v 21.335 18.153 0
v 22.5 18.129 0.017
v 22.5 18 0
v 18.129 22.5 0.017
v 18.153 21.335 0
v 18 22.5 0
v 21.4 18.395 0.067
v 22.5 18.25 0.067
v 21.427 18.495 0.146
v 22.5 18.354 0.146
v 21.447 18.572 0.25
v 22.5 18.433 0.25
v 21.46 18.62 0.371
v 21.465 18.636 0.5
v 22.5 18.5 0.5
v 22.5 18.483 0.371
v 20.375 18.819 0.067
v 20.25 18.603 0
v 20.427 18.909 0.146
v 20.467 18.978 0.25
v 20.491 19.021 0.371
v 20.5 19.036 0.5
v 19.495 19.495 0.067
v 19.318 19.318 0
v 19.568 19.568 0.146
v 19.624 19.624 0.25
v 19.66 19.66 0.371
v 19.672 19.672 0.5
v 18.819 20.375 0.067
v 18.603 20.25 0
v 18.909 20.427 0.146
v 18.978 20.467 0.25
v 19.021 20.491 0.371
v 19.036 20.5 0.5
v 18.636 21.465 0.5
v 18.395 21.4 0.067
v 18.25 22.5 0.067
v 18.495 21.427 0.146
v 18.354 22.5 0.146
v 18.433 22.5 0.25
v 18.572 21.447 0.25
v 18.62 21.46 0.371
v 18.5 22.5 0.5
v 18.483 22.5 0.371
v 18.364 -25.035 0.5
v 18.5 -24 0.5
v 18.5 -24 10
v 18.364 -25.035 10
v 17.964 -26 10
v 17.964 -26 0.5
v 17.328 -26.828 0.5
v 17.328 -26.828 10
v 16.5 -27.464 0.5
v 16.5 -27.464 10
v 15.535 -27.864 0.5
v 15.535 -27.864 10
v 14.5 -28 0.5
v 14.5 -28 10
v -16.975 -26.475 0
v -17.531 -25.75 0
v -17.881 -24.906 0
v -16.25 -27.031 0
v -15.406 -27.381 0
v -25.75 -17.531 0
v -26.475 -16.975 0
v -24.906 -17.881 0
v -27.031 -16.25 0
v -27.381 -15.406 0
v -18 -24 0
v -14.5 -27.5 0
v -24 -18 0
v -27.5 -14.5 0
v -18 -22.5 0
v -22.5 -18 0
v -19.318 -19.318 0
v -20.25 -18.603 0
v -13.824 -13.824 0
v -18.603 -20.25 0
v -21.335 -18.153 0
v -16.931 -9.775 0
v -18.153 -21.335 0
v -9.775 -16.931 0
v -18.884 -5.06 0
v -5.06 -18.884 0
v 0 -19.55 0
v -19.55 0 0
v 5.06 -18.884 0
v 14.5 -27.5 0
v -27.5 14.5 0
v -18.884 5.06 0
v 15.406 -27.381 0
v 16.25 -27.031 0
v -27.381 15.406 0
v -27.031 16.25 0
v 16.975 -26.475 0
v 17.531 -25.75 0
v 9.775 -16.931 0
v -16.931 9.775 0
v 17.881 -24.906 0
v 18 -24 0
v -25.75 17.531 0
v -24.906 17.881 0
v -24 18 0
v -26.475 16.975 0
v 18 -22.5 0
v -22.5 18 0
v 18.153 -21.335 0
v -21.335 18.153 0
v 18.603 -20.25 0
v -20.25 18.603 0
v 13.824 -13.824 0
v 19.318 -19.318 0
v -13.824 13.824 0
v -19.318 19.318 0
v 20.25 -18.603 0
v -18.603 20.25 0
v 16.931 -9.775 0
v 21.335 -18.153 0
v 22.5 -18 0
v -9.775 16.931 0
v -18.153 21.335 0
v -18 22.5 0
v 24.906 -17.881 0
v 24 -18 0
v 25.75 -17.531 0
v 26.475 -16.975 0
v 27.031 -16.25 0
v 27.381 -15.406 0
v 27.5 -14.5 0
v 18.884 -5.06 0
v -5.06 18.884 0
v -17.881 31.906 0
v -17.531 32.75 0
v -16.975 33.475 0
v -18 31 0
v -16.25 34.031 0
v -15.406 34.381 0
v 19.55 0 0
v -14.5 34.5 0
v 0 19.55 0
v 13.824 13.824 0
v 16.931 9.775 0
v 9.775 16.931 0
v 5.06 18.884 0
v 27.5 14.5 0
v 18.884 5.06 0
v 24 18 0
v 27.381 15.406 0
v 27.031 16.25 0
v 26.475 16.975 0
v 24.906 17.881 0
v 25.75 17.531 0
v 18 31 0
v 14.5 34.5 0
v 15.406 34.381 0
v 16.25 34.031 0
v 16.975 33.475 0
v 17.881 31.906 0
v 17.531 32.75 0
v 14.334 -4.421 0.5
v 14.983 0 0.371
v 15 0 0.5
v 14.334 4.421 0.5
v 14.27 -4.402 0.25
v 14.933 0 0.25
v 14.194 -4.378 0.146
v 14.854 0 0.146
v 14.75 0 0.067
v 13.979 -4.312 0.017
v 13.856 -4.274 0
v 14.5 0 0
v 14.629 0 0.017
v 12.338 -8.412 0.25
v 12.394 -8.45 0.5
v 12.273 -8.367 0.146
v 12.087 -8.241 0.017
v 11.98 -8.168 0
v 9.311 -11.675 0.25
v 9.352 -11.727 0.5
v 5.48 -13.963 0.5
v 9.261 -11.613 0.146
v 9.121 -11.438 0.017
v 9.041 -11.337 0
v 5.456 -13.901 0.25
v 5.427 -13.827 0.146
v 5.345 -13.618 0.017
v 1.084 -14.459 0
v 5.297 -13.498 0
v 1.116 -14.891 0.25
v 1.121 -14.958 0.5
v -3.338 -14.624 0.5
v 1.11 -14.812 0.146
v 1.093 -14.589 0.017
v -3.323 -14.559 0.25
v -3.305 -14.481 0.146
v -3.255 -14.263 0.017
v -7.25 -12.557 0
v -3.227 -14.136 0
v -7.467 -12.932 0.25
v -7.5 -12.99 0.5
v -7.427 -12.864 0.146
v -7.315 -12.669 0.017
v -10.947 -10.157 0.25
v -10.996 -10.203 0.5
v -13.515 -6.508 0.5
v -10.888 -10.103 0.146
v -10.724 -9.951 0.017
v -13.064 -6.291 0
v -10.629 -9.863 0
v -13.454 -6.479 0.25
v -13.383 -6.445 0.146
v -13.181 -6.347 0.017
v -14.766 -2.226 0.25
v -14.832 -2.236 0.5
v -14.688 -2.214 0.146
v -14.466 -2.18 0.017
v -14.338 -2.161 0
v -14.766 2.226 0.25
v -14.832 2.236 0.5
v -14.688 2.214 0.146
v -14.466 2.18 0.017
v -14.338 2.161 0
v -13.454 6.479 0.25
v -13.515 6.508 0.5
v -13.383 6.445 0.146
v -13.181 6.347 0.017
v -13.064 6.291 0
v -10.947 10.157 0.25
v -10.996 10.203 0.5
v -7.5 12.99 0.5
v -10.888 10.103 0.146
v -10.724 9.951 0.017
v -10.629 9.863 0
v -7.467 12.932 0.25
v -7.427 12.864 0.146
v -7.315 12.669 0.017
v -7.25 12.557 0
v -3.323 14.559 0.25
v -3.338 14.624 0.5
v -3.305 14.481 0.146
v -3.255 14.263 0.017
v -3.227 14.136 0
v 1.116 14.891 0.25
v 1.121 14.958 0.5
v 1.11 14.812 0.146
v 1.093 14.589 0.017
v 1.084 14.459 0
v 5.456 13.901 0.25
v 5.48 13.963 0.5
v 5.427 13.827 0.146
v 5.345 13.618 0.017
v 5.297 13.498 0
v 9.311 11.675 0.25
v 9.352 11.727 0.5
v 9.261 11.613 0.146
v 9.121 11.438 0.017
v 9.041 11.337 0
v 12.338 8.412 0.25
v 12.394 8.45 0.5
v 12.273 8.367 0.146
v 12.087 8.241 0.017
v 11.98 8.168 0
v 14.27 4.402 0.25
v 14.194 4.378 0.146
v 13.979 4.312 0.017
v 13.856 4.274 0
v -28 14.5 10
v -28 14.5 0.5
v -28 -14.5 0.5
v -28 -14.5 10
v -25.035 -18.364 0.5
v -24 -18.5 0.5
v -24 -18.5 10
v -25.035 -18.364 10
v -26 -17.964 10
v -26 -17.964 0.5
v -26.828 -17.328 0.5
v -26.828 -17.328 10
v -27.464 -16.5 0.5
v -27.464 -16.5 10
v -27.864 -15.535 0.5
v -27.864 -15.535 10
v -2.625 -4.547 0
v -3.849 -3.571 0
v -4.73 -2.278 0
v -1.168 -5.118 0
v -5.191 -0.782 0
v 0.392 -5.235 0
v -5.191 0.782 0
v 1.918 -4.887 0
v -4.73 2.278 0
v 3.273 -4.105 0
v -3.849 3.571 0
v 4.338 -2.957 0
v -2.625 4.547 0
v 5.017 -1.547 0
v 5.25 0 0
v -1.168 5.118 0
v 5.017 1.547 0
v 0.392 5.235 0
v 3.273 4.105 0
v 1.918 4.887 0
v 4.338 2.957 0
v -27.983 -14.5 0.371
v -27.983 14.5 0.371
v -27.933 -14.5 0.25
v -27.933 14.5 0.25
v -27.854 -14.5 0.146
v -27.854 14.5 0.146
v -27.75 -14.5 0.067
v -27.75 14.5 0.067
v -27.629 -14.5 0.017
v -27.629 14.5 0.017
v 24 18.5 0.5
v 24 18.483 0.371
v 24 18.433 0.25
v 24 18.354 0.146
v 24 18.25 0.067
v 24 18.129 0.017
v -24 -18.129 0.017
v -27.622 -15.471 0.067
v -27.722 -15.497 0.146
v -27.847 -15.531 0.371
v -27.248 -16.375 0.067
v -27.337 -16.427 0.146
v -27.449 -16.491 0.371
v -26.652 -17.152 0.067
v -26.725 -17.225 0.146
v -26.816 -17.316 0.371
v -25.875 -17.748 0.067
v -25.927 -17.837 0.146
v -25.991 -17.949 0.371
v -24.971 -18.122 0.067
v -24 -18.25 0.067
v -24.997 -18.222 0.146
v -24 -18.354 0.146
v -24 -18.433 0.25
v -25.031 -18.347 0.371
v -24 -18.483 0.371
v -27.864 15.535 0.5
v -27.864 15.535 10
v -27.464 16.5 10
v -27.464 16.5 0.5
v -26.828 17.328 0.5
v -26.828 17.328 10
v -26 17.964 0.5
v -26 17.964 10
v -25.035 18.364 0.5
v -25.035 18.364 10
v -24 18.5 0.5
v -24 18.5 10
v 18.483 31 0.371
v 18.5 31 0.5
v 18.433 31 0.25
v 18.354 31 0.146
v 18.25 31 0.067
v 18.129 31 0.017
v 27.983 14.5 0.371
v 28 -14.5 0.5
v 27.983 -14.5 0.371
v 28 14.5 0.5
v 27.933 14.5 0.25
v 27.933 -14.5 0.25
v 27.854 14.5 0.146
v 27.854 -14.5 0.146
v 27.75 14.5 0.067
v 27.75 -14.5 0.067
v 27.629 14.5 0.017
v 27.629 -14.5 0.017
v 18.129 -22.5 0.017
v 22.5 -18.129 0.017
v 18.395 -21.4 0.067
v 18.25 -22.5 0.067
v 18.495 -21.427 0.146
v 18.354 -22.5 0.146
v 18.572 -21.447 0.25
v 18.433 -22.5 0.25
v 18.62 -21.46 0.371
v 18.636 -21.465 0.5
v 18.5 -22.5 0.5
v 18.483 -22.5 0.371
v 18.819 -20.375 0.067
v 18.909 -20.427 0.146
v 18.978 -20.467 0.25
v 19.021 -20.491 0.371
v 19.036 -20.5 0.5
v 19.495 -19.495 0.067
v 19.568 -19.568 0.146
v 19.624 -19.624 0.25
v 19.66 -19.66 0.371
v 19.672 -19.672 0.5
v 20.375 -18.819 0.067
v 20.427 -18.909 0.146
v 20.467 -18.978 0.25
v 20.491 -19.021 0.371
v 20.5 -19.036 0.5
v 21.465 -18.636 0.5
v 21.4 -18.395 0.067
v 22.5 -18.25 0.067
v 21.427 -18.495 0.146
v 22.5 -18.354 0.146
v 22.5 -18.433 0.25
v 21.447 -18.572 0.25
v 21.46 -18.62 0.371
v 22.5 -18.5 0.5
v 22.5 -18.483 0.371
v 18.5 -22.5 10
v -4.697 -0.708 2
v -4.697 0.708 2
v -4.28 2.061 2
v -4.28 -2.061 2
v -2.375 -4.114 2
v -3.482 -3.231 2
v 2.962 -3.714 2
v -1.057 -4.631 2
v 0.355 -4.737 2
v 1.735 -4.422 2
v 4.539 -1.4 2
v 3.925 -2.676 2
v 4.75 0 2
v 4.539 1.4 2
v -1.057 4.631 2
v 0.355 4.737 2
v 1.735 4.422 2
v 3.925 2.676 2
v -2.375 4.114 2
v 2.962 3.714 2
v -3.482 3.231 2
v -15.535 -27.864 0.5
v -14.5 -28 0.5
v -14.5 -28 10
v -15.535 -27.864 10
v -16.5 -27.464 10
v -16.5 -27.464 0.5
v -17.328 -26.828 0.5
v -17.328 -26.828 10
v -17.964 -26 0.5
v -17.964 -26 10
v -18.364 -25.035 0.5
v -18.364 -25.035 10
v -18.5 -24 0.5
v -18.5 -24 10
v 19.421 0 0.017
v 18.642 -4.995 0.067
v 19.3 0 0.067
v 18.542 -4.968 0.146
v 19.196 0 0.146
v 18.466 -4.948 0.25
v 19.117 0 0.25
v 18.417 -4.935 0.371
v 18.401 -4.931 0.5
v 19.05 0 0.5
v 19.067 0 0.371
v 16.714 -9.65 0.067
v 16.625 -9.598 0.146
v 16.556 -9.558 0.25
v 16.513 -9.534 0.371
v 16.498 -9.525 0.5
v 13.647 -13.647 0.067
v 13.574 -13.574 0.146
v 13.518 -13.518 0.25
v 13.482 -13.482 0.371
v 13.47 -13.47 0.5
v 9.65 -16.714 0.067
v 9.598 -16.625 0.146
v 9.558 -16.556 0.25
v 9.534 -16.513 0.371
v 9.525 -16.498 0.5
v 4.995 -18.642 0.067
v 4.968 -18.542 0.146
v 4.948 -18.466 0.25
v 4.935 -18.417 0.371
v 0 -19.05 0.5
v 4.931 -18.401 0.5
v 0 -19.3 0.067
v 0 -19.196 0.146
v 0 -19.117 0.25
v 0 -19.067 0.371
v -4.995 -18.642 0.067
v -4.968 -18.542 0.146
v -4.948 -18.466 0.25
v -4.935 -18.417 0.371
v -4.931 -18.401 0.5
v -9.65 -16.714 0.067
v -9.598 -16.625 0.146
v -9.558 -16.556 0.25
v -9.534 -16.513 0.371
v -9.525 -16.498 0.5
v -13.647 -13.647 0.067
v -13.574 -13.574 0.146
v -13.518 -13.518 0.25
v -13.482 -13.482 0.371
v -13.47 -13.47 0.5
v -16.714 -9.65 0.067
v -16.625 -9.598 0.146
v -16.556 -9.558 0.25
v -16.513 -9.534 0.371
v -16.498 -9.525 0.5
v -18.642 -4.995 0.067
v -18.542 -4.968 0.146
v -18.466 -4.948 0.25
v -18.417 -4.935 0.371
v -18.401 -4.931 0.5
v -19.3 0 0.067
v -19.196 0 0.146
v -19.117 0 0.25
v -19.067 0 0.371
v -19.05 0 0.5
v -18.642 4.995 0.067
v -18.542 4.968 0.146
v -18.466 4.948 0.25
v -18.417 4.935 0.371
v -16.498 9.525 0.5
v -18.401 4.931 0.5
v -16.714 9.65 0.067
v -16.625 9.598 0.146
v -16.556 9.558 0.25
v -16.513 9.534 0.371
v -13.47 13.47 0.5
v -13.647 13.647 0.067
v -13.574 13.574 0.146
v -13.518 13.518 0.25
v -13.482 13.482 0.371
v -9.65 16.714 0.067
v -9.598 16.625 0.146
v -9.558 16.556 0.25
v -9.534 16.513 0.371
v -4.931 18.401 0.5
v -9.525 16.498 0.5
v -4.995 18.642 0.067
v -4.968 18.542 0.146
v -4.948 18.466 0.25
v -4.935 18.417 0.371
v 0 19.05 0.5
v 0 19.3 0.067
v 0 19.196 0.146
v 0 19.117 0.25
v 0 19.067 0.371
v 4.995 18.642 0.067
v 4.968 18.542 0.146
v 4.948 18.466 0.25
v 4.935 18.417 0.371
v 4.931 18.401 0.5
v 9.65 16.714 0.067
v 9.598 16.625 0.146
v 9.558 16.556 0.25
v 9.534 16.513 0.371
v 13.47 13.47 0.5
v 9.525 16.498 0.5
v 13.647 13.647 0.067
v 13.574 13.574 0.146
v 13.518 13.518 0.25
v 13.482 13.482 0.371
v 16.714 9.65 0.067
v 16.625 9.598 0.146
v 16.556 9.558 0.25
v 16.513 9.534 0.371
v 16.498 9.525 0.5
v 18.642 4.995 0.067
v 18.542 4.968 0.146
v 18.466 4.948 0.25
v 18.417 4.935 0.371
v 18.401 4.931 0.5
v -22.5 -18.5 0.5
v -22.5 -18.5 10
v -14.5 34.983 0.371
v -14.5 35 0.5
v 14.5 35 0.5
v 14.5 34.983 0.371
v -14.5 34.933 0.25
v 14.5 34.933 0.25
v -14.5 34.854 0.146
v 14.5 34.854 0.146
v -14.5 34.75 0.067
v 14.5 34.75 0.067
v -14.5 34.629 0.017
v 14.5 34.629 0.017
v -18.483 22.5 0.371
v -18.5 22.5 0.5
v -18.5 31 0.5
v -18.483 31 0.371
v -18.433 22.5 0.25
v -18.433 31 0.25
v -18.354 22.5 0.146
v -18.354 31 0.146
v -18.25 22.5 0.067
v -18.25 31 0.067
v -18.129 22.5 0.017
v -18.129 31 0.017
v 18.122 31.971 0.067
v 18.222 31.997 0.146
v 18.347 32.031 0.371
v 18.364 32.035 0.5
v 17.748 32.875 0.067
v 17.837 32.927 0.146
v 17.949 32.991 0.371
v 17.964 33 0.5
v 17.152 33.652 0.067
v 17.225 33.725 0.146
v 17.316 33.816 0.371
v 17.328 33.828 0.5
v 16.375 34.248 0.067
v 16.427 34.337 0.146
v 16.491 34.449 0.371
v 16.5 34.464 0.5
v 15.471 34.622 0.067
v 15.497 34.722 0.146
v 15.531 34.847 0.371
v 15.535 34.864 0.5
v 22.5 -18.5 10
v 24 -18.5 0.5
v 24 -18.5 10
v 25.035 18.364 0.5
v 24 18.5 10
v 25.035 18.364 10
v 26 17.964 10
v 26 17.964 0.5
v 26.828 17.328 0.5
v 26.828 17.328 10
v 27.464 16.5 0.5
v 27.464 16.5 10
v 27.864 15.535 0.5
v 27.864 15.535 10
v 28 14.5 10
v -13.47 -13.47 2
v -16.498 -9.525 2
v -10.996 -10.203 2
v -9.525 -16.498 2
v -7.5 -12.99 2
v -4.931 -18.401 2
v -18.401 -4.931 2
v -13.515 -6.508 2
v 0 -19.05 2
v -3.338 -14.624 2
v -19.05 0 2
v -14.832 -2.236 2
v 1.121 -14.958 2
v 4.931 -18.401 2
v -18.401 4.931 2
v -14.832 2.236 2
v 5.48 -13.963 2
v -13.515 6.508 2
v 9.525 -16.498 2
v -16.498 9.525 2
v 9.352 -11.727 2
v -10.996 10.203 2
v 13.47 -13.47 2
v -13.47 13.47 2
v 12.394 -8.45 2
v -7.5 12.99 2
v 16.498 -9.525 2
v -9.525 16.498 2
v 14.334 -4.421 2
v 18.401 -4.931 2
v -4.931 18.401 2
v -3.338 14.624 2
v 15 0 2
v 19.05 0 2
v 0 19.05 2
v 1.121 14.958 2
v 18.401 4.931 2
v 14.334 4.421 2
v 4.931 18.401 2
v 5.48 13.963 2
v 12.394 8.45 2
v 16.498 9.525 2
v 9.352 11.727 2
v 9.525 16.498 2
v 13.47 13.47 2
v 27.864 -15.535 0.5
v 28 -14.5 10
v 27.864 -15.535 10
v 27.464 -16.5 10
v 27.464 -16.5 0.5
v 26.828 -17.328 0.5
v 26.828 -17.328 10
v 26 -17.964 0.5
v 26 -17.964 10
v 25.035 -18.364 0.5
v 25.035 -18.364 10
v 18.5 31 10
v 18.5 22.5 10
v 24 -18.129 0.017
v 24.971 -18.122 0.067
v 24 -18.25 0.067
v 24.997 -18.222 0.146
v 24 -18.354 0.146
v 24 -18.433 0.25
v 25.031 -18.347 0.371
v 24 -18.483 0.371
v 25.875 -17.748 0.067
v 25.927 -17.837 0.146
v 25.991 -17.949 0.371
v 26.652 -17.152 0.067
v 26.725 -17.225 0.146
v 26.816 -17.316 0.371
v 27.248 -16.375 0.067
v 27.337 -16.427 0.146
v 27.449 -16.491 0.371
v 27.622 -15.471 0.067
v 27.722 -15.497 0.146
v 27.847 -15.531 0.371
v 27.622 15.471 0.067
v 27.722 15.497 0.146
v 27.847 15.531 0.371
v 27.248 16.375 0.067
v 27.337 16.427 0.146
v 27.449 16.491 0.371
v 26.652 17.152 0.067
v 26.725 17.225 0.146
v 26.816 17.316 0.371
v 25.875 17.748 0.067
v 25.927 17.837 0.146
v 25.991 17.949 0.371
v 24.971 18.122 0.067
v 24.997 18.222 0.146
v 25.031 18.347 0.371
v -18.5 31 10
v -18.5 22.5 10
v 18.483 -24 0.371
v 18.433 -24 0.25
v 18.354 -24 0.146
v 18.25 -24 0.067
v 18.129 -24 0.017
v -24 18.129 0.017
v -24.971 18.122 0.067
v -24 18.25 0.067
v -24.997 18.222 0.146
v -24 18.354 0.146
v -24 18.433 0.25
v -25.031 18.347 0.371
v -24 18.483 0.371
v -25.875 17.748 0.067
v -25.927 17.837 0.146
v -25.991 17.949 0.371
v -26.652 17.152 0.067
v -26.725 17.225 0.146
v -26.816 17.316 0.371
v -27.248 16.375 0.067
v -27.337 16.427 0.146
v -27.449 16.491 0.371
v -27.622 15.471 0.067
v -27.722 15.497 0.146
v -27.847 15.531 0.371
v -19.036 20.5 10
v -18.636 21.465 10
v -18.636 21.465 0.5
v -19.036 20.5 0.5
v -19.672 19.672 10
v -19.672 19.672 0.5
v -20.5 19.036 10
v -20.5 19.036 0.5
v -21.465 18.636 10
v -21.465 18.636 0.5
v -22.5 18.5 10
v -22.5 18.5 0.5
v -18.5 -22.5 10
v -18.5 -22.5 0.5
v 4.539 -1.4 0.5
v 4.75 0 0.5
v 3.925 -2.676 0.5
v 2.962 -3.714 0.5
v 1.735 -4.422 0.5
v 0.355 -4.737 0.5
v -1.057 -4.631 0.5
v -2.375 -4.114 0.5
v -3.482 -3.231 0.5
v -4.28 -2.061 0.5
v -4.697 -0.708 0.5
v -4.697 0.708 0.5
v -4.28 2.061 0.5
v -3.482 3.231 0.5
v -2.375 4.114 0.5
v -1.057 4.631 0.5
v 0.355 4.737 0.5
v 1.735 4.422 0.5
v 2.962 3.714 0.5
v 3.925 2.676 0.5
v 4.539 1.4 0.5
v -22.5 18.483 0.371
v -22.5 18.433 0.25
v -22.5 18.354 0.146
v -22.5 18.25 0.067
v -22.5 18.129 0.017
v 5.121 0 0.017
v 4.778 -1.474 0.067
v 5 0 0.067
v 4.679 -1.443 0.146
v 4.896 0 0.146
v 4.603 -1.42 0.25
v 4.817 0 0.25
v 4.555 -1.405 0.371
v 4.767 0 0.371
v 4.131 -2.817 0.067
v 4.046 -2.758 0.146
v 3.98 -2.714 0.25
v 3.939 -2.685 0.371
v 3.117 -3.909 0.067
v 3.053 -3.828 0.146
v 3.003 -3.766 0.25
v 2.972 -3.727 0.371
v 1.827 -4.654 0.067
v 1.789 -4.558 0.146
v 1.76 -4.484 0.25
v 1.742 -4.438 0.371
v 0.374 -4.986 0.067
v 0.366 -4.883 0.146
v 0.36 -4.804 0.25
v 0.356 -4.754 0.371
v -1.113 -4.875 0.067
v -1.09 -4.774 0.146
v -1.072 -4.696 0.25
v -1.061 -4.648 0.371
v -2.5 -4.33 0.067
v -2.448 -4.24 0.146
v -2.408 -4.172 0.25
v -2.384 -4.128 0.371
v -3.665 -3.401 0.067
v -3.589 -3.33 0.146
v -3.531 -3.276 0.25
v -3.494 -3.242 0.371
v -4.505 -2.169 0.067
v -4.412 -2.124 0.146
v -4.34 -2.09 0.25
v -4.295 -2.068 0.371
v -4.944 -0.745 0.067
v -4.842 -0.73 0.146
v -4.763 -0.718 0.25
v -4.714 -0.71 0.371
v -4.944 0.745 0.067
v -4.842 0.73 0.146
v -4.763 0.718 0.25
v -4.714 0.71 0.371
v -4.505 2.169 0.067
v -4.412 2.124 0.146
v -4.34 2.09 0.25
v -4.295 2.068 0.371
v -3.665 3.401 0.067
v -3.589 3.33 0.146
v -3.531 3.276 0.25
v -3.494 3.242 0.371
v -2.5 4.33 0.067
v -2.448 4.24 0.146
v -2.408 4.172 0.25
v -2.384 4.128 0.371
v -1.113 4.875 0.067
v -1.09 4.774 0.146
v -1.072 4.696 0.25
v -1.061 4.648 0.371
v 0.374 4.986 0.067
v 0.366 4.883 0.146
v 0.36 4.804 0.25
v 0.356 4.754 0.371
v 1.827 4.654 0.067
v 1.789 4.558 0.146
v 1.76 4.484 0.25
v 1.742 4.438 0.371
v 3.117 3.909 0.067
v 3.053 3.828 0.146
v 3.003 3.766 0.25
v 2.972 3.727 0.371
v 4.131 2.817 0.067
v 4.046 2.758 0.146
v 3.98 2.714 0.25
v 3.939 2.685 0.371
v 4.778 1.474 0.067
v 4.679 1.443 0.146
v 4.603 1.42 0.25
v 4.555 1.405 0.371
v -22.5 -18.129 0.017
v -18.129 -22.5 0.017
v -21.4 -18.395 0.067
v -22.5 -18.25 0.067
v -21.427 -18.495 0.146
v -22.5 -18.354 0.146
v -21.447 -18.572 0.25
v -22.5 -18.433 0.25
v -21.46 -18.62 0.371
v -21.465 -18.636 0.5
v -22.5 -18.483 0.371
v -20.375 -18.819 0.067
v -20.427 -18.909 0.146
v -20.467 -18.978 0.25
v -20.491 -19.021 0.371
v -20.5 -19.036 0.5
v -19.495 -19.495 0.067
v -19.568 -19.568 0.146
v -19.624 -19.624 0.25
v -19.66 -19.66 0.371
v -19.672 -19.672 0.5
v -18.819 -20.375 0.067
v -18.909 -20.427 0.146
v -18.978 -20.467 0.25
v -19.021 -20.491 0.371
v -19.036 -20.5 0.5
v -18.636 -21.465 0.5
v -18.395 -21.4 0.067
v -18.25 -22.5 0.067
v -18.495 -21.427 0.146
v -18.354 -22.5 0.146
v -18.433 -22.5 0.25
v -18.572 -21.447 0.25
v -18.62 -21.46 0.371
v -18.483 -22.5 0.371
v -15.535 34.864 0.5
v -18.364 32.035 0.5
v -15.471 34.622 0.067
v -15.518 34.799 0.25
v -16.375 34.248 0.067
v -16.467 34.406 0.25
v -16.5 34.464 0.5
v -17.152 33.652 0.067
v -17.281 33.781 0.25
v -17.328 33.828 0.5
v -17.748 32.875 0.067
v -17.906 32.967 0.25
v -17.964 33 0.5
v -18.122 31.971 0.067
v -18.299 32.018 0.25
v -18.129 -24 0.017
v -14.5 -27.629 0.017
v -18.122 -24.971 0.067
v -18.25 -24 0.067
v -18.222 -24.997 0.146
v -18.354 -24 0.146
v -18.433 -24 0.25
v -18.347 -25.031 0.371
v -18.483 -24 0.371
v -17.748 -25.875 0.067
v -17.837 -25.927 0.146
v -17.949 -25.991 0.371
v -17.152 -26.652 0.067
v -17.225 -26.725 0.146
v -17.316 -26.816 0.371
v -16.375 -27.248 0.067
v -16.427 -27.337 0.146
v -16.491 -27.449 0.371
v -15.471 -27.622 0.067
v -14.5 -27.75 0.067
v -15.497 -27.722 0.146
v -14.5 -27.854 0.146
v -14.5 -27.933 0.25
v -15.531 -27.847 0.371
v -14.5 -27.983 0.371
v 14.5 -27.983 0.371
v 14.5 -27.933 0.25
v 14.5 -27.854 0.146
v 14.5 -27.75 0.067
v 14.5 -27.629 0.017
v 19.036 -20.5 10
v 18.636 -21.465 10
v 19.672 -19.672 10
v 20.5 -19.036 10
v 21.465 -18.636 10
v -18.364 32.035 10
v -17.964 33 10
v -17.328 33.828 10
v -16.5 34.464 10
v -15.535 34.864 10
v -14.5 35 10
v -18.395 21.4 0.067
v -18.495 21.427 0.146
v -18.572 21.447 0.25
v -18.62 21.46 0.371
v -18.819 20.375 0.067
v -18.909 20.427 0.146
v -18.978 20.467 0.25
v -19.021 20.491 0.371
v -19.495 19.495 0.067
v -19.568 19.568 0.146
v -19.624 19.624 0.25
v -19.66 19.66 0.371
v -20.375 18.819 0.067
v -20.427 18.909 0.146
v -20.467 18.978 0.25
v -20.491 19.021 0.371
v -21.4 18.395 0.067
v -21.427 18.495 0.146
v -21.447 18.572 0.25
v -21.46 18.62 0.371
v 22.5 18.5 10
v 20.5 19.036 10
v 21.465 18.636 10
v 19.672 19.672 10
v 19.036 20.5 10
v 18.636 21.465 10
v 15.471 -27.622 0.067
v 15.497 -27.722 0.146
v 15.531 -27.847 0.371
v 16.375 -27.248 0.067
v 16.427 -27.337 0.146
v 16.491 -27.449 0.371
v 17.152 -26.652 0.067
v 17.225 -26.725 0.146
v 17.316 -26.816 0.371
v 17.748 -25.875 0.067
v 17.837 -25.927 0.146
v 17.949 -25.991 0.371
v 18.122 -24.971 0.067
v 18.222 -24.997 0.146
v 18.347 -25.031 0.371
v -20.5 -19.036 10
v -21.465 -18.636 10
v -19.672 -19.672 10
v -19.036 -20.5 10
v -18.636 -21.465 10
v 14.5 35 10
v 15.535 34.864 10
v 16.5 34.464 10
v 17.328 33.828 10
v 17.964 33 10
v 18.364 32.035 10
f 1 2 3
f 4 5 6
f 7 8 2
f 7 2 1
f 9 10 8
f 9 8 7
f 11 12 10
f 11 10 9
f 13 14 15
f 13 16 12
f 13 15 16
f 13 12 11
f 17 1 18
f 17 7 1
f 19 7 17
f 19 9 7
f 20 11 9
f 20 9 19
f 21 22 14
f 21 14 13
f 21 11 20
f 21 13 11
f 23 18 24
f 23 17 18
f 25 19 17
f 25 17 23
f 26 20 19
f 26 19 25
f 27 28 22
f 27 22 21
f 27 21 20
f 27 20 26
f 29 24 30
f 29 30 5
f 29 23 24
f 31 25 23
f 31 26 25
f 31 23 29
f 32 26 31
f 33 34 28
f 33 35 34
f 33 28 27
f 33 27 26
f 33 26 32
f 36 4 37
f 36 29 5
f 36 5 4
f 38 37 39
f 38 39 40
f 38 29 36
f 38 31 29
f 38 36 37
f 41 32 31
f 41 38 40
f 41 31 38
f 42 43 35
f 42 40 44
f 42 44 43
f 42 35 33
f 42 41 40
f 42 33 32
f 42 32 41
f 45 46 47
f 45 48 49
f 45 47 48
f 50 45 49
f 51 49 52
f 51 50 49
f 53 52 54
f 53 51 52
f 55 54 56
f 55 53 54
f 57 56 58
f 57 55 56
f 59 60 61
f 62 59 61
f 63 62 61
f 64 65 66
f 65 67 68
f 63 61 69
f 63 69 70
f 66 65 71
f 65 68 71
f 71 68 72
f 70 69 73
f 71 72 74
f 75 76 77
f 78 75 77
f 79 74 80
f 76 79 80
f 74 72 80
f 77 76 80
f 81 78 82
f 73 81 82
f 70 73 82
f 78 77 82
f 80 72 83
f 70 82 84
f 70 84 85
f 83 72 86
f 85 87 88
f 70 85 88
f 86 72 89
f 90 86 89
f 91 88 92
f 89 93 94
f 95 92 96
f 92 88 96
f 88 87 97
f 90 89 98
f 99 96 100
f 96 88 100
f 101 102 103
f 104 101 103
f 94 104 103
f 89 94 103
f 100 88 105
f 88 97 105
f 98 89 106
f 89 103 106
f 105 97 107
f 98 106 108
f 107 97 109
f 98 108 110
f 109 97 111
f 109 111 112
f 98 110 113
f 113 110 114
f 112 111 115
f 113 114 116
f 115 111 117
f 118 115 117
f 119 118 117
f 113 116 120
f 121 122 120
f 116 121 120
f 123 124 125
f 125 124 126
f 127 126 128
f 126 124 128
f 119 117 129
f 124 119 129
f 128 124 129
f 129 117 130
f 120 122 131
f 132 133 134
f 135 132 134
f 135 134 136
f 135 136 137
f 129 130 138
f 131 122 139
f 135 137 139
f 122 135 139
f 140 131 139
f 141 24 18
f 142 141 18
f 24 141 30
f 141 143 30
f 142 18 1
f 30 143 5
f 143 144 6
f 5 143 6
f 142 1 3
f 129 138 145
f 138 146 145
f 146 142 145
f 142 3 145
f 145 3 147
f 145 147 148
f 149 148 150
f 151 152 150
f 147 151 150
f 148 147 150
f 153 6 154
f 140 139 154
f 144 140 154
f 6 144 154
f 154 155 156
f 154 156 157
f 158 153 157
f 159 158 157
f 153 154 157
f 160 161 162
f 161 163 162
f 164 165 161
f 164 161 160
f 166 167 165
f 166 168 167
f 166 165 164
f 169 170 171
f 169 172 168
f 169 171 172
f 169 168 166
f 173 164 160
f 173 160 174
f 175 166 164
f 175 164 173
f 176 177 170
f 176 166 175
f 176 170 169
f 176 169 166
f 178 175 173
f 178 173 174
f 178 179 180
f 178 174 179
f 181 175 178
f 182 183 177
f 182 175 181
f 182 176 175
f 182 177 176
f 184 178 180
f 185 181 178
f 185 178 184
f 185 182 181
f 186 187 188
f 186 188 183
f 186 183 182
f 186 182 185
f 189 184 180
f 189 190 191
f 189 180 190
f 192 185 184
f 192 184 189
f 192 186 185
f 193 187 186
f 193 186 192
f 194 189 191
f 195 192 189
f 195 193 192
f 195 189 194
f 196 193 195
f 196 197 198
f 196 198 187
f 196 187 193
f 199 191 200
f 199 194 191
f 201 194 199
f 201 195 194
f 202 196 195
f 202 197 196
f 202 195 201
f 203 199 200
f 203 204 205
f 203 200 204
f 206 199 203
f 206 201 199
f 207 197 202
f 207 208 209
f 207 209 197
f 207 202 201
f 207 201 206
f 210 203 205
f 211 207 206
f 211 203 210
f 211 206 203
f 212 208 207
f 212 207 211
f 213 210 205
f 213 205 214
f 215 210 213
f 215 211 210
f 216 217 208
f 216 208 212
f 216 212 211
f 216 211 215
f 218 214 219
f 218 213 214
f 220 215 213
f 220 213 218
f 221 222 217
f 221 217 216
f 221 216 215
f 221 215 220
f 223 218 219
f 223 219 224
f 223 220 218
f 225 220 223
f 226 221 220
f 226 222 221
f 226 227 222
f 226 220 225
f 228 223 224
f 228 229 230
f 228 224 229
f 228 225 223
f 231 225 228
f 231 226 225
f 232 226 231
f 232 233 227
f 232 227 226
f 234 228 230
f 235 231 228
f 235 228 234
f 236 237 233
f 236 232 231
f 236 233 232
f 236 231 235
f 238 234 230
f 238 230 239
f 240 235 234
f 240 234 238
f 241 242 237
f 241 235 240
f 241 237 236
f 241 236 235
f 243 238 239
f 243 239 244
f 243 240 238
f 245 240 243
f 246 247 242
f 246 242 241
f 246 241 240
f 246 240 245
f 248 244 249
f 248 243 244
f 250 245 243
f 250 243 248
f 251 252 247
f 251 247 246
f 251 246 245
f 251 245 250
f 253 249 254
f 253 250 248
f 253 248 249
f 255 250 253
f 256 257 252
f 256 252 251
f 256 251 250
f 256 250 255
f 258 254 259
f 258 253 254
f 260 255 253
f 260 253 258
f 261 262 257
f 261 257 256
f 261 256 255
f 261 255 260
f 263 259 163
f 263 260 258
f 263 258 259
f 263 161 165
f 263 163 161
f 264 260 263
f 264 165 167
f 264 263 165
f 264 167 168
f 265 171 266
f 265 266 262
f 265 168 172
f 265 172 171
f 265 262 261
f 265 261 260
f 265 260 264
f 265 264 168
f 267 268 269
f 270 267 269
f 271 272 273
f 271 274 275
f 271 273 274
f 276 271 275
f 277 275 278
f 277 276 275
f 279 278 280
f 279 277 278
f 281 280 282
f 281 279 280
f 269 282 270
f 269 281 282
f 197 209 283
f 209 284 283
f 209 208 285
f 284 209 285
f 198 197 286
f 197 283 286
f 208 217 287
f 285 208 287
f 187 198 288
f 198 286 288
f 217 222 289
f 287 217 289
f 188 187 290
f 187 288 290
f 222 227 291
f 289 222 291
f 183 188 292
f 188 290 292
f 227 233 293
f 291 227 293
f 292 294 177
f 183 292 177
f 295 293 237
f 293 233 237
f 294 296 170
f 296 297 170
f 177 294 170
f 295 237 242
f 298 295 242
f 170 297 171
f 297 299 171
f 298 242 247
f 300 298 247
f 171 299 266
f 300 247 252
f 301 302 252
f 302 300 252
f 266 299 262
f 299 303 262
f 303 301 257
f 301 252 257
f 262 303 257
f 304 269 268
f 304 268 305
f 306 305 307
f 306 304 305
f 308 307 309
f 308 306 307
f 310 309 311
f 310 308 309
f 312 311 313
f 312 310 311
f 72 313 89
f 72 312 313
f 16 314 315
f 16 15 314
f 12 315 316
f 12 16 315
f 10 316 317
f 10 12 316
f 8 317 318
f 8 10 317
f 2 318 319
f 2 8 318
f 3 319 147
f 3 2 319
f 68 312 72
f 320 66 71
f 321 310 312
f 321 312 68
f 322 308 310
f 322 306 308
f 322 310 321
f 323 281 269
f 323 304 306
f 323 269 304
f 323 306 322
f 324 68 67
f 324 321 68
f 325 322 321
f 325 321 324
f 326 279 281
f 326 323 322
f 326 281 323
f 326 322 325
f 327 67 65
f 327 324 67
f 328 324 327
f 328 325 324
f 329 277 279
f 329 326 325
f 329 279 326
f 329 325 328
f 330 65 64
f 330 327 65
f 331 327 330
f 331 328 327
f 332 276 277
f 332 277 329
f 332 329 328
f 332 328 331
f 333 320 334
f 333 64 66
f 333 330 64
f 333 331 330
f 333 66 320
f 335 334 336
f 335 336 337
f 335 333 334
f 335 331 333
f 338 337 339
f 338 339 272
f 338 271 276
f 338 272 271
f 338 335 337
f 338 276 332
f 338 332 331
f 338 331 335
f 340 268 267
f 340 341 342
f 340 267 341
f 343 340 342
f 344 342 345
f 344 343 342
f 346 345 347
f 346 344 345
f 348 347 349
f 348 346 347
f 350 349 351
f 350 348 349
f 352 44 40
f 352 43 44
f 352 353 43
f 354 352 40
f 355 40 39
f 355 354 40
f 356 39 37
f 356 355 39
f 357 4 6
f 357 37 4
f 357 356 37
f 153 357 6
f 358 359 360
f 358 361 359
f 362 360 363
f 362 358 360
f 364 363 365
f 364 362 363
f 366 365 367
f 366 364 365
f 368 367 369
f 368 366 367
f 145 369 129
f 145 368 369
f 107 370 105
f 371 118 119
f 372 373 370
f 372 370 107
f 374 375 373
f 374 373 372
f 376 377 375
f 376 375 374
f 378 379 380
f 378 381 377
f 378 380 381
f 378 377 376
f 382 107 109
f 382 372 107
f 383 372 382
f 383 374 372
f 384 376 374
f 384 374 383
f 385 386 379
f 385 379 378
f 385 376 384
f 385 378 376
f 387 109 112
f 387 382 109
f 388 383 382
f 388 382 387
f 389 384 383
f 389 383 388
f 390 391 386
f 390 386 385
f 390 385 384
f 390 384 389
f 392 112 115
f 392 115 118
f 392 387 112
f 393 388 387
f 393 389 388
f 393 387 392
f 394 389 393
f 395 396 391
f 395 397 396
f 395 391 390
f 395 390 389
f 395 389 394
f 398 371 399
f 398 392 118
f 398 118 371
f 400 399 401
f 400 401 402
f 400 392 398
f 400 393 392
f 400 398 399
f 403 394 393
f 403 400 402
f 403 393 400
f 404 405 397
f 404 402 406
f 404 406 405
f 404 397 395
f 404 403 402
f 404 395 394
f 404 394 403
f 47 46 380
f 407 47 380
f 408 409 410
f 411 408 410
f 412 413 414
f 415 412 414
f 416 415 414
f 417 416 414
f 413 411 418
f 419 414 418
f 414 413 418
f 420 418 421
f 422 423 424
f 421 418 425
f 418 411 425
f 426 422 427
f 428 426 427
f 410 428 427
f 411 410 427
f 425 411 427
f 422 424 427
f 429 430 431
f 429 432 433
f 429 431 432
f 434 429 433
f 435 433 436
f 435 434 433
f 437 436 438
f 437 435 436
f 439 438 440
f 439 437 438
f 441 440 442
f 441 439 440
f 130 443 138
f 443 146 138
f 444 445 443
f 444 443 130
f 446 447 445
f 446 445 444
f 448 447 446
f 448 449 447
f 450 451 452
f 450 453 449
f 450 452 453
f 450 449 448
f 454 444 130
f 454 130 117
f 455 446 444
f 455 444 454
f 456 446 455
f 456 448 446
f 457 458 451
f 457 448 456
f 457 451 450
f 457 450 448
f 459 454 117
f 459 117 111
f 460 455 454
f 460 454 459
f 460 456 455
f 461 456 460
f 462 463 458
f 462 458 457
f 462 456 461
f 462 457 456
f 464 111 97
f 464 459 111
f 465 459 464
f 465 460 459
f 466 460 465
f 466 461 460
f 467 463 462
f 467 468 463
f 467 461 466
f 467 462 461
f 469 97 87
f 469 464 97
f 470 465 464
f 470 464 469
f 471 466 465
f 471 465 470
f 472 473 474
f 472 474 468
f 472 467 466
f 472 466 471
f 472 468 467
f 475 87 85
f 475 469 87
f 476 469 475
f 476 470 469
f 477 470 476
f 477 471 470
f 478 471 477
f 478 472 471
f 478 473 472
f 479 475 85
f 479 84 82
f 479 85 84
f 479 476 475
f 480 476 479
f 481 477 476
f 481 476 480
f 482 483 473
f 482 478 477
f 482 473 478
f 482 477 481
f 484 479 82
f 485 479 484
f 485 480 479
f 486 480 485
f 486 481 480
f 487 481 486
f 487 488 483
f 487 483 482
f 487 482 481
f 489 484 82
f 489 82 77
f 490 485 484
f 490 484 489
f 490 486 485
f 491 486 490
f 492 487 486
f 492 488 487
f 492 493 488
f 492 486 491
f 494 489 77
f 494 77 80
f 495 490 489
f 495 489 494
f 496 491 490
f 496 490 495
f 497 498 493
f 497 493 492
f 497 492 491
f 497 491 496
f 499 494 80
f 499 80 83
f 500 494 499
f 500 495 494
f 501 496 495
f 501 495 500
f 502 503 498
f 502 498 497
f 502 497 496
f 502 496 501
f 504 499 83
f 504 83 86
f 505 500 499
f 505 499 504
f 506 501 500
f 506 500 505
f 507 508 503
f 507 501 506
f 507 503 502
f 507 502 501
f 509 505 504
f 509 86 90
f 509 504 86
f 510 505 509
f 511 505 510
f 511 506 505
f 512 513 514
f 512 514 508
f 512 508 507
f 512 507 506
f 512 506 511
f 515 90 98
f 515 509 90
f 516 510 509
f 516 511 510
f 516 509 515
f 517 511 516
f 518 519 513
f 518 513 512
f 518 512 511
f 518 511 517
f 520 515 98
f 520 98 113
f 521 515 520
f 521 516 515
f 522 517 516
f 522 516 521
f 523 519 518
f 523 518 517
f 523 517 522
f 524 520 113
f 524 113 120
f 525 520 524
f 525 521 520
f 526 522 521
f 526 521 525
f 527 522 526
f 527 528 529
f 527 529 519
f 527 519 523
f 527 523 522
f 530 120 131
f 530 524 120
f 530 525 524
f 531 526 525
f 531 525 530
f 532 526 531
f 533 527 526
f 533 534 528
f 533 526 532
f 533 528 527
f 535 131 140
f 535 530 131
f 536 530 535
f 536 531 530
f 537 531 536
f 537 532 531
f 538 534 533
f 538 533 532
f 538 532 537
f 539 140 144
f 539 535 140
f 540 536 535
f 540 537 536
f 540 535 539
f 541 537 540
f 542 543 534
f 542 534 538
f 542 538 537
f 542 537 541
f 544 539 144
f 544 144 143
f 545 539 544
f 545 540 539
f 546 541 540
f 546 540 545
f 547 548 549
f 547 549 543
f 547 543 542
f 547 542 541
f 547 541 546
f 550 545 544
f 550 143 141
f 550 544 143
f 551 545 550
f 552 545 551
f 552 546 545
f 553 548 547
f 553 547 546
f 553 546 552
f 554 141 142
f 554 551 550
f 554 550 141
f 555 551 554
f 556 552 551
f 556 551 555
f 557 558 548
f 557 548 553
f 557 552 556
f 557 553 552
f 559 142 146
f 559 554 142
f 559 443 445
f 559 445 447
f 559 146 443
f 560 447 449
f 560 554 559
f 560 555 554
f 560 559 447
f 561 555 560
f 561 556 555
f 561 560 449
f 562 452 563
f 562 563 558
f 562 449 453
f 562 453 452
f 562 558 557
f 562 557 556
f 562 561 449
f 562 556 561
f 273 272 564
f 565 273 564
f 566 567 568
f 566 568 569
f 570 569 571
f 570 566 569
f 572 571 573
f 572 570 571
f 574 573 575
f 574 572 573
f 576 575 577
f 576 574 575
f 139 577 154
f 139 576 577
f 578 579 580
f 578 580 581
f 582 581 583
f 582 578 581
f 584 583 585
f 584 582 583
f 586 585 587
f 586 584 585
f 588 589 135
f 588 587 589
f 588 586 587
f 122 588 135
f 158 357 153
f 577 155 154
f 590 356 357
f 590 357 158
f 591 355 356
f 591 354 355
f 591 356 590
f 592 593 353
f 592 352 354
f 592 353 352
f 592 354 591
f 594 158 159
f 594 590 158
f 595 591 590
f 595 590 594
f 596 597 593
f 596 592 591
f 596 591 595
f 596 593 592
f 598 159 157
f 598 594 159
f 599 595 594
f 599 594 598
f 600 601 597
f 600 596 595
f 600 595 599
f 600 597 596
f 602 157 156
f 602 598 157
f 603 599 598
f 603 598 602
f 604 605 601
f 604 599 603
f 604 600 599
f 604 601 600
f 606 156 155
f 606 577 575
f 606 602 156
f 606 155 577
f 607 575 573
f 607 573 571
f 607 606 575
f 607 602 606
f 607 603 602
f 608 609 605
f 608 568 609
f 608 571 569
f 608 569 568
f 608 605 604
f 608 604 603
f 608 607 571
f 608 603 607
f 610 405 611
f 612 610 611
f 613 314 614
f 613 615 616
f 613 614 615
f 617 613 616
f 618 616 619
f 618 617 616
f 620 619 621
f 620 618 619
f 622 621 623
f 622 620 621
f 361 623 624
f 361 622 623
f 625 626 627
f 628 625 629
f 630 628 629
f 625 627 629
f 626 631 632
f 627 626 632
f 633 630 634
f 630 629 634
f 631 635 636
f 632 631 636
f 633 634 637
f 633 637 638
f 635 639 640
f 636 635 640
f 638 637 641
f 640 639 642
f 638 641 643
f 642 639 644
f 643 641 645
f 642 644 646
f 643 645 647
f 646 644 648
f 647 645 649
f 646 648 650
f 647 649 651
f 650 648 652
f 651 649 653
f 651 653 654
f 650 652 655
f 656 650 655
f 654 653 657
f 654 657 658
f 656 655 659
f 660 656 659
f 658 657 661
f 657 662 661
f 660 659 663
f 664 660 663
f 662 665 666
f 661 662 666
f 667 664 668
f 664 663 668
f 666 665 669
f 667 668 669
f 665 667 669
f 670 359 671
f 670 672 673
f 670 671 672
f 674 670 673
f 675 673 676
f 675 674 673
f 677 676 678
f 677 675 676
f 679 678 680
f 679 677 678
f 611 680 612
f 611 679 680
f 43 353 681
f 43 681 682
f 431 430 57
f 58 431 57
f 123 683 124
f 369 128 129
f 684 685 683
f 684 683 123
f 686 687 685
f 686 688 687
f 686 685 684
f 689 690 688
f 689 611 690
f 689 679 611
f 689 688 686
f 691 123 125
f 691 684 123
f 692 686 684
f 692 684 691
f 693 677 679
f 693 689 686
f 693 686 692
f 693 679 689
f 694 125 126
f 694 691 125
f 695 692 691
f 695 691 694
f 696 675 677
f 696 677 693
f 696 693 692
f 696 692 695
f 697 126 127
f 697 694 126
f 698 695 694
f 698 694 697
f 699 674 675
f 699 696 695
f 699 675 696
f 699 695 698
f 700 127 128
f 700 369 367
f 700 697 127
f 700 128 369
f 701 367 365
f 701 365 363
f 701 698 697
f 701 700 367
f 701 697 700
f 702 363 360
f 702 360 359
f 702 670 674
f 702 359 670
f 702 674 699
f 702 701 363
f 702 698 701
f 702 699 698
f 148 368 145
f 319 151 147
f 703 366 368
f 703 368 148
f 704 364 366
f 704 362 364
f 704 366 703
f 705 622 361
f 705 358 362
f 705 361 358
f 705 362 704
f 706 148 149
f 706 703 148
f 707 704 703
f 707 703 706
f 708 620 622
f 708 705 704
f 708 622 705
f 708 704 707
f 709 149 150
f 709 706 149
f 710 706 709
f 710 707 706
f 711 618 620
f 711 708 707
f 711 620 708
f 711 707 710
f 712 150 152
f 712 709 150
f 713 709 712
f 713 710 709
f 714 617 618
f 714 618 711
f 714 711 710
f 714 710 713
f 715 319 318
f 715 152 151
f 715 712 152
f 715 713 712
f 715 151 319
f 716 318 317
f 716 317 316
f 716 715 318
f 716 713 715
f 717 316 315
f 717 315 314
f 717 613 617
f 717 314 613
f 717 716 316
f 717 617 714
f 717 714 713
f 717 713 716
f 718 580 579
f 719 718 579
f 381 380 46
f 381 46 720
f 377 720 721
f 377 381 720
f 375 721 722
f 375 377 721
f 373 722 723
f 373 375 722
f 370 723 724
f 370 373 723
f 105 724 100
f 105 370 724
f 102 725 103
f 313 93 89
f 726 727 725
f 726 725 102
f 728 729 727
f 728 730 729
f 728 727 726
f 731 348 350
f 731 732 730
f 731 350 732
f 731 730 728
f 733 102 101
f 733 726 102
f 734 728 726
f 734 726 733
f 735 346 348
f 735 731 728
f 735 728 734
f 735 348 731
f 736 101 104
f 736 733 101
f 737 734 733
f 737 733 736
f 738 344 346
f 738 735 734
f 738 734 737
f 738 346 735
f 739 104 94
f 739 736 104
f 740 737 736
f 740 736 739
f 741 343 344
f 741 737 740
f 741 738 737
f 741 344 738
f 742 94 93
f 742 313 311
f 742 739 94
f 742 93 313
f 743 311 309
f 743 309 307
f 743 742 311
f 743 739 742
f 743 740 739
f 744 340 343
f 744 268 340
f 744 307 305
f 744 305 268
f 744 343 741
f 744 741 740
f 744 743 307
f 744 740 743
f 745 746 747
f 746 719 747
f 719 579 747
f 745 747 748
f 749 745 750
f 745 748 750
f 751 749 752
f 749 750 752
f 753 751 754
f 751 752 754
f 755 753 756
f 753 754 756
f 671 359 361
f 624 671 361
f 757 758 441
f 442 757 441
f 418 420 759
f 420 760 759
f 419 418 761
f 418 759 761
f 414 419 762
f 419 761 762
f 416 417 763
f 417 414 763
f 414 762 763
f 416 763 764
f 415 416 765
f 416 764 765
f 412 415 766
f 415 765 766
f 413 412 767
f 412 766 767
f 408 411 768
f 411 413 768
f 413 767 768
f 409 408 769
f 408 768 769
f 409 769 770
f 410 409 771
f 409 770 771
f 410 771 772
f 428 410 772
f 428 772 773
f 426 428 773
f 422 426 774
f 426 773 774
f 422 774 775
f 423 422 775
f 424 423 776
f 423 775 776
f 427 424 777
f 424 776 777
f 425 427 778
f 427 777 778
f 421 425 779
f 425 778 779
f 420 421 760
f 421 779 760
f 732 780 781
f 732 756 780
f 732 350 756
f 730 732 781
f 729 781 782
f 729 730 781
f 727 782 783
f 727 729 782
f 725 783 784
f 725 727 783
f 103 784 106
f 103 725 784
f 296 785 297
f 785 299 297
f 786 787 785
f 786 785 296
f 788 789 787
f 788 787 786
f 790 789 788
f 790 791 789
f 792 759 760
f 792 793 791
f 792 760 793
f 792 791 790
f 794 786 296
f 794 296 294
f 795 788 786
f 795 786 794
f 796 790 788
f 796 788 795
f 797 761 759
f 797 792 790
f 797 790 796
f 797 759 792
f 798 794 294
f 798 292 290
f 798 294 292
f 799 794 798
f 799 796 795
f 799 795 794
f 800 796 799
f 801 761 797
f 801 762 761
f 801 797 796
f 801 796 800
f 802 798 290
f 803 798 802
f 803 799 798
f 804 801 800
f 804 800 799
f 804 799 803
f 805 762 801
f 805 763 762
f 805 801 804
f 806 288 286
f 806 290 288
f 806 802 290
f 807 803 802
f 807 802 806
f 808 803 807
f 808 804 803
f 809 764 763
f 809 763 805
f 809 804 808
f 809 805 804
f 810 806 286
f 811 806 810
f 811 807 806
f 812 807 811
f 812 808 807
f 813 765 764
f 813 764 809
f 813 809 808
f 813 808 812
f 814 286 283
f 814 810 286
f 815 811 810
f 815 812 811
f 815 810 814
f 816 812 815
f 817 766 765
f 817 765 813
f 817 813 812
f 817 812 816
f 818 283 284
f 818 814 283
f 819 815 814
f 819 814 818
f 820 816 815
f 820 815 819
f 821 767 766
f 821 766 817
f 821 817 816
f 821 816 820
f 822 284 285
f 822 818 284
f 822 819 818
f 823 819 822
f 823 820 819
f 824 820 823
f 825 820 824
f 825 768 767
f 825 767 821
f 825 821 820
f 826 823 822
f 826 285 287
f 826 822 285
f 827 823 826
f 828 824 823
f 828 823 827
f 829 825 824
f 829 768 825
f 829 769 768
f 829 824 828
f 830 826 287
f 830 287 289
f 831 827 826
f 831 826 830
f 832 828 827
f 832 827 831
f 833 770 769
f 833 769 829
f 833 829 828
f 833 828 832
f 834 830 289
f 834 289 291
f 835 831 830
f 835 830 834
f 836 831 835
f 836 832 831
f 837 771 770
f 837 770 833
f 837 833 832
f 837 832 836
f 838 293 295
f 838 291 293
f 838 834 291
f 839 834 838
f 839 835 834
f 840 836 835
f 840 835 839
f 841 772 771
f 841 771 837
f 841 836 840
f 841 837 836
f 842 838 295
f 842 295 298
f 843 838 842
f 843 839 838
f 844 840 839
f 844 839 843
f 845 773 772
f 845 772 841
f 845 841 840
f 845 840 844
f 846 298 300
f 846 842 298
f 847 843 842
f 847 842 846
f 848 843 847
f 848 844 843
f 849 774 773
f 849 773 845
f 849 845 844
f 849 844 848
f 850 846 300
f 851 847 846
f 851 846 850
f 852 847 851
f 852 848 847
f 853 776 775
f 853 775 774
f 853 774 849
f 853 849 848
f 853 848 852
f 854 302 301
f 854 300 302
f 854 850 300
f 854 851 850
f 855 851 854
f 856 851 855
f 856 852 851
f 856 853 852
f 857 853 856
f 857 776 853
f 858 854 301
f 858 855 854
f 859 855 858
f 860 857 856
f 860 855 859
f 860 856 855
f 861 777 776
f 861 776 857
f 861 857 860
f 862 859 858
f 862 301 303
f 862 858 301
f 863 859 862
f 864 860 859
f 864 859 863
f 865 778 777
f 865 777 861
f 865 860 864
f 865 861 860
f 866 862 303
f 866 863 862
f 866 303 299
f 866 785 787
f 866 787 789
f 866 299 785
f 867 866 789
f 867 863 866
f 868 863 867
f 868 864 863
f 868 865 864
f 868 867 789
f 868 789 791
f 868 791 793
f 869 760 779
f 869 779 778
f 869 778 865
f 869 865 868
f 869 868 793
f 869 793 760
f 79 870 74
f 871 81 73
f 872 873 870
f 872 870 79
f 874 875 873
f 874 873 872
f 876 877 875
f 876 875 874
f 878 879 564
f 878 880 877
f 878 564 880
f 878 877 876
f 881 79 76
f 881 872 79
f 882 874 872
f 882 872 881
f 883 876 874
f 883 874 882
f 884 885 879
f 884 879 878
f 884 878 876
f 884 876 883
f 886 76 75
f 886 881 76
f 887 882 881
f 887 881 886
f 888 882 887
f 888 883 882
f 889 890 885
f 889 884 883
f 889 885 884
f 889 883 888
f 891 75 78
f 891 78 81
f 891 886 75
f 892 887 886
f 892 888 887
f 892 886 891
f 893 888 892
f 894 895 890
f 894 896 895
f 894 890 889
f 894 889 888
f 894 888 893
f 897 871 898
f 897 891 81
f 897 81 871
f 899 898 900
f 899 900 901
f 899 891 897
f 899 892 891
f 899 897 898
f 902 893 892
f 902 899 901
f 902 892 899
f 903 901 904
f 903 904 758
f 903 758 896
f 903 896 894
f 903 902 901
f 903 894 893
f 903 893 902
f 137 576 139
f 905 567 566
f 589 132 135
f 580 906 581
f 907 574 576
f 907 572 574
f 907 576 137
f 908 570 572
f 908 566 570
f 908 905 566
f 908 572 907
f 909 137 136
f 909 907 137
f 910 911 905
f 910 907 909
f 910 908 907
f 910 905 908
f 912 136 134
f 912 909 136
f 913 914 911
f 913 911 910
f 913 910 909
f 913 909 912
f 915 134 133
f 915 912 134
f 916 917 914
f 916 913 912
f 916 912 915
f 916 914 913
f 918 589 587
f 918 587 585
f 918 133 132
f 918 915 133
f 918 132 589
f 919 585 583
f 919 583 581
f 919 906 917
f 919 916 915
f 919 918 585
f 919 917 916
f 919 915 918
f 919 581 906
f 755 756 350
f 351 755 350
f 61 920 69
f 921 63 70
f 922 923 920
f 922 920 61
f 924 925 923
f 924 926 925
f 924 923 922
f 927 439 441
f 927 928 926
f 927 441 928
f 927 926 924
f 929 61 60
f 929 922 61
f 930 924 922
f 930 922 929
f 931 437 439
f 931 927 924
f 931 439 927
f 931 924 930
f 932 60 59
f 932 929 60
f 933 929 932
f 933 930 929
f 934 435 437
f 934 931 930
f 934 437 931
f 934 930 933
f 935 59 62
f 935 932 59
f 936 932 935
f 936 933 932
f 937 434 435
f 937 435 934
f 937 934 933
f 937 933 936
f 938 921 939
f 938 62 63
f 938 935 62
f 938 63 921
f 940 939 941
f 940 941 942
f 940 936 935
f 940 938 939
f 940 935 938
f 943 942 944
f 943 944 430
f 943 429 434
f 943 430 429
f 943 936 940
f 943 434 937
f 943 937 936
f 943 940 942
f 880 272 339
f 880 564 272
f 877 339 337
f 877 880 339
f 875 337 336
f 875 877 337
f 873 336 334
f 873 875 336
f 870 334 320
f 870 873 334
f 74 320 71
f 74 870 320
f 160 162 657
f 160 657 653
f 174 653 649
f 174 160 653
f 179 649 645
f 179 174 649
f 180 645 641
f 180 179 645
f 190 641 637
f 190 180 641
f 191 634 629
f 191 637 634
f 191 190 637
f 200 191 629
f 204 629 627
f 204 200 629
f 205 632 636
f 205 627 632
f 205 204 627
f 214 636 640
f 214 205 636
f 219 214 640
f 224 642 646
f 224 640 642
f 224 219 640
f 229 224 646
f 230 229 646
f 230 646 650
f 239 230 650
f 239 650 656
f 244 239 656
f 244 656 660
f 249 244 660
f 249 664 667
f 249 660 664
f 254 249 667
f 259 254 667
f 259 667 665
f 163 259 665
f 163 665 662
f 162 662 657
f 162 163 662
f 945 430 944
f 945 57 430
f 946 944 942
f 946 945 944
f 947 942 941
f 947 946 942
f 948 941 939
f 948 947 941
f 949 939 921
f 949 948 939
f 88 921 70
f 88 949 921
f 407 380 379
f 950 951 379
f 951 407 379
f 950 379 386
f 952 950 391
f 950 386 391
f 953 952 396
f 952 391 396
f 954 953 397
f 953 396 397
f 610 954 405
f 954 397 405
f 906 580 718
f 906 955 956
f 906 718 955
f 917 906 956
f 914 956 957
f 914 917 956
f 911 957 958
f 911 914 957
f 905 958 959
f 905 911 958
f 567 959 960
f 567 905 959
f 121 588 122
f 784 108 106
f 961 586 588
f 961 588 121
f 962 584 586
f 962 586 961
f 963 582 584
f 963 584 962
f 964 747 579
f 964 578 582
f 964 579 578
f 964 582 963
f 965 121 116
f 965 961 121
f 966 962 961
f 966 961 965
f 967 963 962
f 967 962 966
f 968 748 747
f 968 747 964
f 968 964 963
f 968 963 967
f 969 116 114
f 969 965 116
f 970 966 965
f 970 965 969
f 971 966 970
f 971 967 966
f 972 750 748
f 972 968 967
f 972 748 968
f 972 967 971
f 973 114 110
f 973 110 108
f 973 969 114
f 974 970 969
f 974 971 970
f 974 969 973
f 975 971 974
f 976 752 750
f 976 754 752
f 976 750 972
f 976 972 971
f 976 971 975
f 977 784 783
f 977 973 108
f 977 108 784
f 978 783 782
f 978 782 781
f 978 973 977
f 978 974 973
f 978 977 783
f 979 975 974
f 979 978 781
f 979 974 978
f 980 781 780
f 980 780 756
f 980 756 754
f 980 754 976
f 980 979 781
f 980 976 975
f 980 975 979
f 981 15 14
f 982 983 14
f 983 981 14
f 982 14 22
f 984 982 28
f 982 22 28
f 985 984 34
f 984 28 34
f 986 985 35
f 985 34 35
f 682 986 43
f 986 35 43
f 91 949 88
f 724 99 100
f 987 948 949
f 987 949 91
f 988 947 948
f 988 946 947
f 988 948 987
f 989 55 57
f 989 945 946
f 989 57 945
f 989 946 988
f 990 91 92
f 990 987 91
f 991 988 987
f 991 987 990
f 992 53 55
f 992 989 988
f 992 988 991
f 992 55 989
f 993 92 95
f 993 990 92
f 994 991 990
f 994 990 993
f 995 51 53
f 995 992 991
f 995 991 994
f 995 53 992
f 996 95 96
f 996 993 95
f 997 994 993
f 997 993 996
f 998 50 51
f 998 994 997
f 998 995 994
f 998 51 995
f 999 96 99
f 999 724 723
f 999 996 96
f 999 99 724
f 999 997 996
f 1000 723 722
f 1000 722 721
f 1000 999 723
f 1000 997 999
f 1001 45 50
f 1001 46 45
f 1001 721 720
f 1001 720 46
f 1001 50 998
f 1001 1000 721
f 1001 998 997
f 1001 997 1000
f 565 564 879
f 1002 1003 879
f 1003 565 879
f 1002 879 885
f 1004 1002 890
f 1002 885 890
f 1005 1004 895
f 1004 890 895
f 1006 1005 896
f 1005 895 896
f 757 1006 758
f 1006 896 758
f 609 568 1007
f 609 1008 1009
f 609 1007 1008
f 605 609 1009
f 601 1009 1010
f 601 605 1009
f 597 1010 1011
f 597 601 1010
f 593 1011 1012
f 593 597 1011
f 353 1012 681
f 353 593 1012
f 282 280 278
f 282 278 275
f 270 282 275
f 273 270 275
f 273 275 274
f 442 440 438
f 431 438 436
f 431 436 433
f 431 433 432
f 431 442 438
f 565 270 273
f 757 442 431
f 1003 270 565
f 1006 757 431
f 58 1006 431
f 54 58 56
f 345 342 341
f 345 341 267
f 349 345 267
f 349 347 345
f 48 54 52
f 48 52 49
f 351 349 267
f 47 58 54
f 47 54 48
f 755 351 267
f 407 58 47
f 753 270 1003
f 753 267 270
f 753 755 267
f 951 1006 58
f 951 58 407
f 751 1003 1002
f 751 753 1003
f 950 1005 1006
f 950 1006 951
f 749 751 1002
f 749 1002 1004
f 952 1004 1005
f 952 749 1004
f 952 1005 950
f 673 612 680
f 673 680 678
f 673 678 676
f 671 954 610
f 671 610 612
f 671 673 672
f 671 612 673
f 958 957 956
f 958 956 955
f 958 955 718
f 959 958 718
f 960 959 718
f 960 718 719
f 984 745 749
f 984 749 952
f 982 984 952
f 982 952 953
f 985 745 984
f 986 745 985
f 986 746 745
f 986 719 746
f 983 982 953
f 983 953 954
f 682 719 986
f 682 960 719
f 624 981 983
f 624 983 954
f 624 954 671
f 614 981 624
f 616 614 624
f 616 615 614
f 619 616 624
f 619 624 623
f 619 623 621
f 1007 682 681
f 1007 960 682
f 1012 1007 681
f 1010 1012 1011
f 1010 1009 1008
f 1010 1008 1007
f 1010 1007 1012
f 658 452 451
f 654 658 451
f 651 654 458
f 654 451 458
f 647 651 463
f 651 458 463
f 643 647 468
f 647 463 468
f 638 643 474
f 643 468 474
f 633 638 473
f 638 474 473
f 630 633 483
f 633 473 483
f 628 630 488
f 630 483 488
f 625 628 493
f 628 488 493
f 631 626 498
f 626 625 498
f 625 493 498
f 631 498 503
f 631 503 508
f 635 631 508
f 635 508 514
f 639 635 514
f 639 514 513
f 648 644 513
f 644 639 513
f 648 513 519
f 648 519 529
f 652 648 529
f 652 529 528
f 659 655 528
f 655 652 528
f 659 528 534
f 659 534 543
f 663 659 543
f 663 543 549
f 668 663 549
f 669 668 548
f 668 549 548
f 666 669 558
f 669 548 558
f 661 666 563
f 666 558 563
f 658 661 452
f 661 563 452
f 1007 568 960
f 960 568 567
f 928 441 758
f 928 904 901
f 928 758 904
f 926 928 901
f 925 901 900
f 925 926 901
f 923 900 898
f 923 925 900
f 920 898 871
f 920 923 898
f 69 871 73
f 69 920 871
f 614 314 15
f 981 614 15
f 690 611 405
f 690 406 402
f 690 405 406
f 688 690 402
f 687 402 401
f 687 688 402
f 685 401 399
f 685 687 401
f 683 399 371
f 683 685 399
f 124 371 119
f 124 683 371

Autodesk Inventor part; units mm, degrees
ref_plane "YZ Plane" through (0, 0, 0) normal (1, 0, 0) x (0, 1, 0)
ref_plane "XZ Plane" through (0, 0, 0) normal (0, 1, 0) x (-1, 0, 0)
ref_plane "XY Plane" through (0, 0, 0) normal (0, 0, 1) x (1, 0, 0)
sketch "Sketch1" plane through (0, 0, 0) normal (0, 0, 1) x (1, 0, 0)
  arc A0 (-24, 18.5) -> (-28, 14.5) centre (-24, 14.5) ccw
  line L0 (-28, 14.5) -> (-28, -14.5)
  arc A1 (-28, -14.5) -> (-24, -18.5) centre (-24, -14.5) ccw
  line L1 (-24, -18.5) -> (-22.5, -18.5)
  arc A2 (-18.5, -22.5) -> (-22.5, -18.5) centre (-22.5, -22.5) ccw
  line L2 (-18.5, -22.5) -> (-18.5, -24)
  arc A3 (-18.5, -24) -> (-14.5, -28) centre (-14.5, -24) ccw
  line L3 (-14.5, -28) -> (14.5, -28)
  arc A4 (14.5, -28) -> (18.5, -24) centre (14.5, -24) ccw
  line L4 (18.5, -24) -> (18.5, -22.5)
  arc A5 (22.5, -18.5) -> (18.5, -22.5) centre (22.5, -22.5) ccw
  line L5 (22.5, -18.5) -> (24, -18.5)
  arc A6 (24, -18.5) -> (28, -14.5) centre (24, -14.5) ccw
  line L6 (28, -14.5) -> (28, 14.5)
  arc A7 (28, 14.5) -> (24, 18.5) centre (24, 14.5) ccw
  line L7 (24, 18.5) -> (22.5, 18.5)
  arc A8 (18.5, 22.5) -> (22.5, 18.5) centre (22.5, 22.5) ccw
  line L8 (18.5, 22.5) -> (18.5, 24)
  line L9 (-18.5, 24) -> (-18.5, 22.5)
  arc A9 (-22.5, 18.5) -> (-18.5, 22.5) centre (-22.5, 22.5) ccw
  line L10 (-22.5, 18.5) -> (-24, 18.5)
  line L11 (0, 35) -> (-14.5, 35)
  line L12 (-18.5, 31) -> (-18.5, 24)
  line L13 (0, 35) -> (14.5, 35)
  line L14 (18.5, 31) -> (18.5, 24)
  arc A10 (-14.5, 35) -> (-18.5, 31) centre (-14.5, 31) ccw
  arc A11 (18.5, 31) -> (14.5, 35) centre (14.5, 31) ccw
  circle A12 centre (0, 0) radius 4.75
  circle A13 centre (0, 0) radius 15
  circle A14 centre (0, 0) radius 19.05
  circle A15 centre (0, 0) radius 3.15
  dimension "d1" = 4
  dimension "d4" = 9.5
  dimension "d5" = 30
  dimension "d6" = 38.1
  dimension "d7" = 6.3
extrude "Extrusion1" add sketch "Sketch1" along normal blind 10 contours L10 A9 L9 L12 A10 L11 L13 A11 L14 L8 A8 L7 A7 L6 A6 L5 A5 L4 A4 L3 A3 L2 A2 L1 A1 L0 A0 | A12 | A13 | A14 | A15
extrude "Extrusion2" cut sketch "Sketch1" along normal blind 2 contours A12 | A14 | A15
fillet "Fillet1" radius 0.5 27 edges at (-17.3284, 33.8284, 0) (-18.5, 26.75, 0) (-19.6716, 19.6716, 0) (-23.25, 18.5, 0) (-26.8284, 17.3284, 0) (-28, 0, 0) (-26.8284, -17.3284, 0) (-23.25, -18.5, 0) (-19.6716, -19.6716, 0) (-18.5, -23.25, 0) (-17.3284, -26.8284, 0) (0, -28, 0) (17.3284, -26.8284, 0) (18.5, -23.25, 0) (19.6716, -19.6716, 0) (23.25, -18.5, 0) (26.8284, -17.3284, 0) (28, 0, 0) (26.8284, 17.3284, 0) (23.25, 18.5, 0) (19.6716, 19.6716, 0) (18.5, 26.75, 0) (17.3284, 33.8284, 0) (0, 35, 0) (-19.05, 0, 0) (-15, 0, 0) (-4.75, 0, 0)
properties part number "SERVO  KH56KM2U121 C"
